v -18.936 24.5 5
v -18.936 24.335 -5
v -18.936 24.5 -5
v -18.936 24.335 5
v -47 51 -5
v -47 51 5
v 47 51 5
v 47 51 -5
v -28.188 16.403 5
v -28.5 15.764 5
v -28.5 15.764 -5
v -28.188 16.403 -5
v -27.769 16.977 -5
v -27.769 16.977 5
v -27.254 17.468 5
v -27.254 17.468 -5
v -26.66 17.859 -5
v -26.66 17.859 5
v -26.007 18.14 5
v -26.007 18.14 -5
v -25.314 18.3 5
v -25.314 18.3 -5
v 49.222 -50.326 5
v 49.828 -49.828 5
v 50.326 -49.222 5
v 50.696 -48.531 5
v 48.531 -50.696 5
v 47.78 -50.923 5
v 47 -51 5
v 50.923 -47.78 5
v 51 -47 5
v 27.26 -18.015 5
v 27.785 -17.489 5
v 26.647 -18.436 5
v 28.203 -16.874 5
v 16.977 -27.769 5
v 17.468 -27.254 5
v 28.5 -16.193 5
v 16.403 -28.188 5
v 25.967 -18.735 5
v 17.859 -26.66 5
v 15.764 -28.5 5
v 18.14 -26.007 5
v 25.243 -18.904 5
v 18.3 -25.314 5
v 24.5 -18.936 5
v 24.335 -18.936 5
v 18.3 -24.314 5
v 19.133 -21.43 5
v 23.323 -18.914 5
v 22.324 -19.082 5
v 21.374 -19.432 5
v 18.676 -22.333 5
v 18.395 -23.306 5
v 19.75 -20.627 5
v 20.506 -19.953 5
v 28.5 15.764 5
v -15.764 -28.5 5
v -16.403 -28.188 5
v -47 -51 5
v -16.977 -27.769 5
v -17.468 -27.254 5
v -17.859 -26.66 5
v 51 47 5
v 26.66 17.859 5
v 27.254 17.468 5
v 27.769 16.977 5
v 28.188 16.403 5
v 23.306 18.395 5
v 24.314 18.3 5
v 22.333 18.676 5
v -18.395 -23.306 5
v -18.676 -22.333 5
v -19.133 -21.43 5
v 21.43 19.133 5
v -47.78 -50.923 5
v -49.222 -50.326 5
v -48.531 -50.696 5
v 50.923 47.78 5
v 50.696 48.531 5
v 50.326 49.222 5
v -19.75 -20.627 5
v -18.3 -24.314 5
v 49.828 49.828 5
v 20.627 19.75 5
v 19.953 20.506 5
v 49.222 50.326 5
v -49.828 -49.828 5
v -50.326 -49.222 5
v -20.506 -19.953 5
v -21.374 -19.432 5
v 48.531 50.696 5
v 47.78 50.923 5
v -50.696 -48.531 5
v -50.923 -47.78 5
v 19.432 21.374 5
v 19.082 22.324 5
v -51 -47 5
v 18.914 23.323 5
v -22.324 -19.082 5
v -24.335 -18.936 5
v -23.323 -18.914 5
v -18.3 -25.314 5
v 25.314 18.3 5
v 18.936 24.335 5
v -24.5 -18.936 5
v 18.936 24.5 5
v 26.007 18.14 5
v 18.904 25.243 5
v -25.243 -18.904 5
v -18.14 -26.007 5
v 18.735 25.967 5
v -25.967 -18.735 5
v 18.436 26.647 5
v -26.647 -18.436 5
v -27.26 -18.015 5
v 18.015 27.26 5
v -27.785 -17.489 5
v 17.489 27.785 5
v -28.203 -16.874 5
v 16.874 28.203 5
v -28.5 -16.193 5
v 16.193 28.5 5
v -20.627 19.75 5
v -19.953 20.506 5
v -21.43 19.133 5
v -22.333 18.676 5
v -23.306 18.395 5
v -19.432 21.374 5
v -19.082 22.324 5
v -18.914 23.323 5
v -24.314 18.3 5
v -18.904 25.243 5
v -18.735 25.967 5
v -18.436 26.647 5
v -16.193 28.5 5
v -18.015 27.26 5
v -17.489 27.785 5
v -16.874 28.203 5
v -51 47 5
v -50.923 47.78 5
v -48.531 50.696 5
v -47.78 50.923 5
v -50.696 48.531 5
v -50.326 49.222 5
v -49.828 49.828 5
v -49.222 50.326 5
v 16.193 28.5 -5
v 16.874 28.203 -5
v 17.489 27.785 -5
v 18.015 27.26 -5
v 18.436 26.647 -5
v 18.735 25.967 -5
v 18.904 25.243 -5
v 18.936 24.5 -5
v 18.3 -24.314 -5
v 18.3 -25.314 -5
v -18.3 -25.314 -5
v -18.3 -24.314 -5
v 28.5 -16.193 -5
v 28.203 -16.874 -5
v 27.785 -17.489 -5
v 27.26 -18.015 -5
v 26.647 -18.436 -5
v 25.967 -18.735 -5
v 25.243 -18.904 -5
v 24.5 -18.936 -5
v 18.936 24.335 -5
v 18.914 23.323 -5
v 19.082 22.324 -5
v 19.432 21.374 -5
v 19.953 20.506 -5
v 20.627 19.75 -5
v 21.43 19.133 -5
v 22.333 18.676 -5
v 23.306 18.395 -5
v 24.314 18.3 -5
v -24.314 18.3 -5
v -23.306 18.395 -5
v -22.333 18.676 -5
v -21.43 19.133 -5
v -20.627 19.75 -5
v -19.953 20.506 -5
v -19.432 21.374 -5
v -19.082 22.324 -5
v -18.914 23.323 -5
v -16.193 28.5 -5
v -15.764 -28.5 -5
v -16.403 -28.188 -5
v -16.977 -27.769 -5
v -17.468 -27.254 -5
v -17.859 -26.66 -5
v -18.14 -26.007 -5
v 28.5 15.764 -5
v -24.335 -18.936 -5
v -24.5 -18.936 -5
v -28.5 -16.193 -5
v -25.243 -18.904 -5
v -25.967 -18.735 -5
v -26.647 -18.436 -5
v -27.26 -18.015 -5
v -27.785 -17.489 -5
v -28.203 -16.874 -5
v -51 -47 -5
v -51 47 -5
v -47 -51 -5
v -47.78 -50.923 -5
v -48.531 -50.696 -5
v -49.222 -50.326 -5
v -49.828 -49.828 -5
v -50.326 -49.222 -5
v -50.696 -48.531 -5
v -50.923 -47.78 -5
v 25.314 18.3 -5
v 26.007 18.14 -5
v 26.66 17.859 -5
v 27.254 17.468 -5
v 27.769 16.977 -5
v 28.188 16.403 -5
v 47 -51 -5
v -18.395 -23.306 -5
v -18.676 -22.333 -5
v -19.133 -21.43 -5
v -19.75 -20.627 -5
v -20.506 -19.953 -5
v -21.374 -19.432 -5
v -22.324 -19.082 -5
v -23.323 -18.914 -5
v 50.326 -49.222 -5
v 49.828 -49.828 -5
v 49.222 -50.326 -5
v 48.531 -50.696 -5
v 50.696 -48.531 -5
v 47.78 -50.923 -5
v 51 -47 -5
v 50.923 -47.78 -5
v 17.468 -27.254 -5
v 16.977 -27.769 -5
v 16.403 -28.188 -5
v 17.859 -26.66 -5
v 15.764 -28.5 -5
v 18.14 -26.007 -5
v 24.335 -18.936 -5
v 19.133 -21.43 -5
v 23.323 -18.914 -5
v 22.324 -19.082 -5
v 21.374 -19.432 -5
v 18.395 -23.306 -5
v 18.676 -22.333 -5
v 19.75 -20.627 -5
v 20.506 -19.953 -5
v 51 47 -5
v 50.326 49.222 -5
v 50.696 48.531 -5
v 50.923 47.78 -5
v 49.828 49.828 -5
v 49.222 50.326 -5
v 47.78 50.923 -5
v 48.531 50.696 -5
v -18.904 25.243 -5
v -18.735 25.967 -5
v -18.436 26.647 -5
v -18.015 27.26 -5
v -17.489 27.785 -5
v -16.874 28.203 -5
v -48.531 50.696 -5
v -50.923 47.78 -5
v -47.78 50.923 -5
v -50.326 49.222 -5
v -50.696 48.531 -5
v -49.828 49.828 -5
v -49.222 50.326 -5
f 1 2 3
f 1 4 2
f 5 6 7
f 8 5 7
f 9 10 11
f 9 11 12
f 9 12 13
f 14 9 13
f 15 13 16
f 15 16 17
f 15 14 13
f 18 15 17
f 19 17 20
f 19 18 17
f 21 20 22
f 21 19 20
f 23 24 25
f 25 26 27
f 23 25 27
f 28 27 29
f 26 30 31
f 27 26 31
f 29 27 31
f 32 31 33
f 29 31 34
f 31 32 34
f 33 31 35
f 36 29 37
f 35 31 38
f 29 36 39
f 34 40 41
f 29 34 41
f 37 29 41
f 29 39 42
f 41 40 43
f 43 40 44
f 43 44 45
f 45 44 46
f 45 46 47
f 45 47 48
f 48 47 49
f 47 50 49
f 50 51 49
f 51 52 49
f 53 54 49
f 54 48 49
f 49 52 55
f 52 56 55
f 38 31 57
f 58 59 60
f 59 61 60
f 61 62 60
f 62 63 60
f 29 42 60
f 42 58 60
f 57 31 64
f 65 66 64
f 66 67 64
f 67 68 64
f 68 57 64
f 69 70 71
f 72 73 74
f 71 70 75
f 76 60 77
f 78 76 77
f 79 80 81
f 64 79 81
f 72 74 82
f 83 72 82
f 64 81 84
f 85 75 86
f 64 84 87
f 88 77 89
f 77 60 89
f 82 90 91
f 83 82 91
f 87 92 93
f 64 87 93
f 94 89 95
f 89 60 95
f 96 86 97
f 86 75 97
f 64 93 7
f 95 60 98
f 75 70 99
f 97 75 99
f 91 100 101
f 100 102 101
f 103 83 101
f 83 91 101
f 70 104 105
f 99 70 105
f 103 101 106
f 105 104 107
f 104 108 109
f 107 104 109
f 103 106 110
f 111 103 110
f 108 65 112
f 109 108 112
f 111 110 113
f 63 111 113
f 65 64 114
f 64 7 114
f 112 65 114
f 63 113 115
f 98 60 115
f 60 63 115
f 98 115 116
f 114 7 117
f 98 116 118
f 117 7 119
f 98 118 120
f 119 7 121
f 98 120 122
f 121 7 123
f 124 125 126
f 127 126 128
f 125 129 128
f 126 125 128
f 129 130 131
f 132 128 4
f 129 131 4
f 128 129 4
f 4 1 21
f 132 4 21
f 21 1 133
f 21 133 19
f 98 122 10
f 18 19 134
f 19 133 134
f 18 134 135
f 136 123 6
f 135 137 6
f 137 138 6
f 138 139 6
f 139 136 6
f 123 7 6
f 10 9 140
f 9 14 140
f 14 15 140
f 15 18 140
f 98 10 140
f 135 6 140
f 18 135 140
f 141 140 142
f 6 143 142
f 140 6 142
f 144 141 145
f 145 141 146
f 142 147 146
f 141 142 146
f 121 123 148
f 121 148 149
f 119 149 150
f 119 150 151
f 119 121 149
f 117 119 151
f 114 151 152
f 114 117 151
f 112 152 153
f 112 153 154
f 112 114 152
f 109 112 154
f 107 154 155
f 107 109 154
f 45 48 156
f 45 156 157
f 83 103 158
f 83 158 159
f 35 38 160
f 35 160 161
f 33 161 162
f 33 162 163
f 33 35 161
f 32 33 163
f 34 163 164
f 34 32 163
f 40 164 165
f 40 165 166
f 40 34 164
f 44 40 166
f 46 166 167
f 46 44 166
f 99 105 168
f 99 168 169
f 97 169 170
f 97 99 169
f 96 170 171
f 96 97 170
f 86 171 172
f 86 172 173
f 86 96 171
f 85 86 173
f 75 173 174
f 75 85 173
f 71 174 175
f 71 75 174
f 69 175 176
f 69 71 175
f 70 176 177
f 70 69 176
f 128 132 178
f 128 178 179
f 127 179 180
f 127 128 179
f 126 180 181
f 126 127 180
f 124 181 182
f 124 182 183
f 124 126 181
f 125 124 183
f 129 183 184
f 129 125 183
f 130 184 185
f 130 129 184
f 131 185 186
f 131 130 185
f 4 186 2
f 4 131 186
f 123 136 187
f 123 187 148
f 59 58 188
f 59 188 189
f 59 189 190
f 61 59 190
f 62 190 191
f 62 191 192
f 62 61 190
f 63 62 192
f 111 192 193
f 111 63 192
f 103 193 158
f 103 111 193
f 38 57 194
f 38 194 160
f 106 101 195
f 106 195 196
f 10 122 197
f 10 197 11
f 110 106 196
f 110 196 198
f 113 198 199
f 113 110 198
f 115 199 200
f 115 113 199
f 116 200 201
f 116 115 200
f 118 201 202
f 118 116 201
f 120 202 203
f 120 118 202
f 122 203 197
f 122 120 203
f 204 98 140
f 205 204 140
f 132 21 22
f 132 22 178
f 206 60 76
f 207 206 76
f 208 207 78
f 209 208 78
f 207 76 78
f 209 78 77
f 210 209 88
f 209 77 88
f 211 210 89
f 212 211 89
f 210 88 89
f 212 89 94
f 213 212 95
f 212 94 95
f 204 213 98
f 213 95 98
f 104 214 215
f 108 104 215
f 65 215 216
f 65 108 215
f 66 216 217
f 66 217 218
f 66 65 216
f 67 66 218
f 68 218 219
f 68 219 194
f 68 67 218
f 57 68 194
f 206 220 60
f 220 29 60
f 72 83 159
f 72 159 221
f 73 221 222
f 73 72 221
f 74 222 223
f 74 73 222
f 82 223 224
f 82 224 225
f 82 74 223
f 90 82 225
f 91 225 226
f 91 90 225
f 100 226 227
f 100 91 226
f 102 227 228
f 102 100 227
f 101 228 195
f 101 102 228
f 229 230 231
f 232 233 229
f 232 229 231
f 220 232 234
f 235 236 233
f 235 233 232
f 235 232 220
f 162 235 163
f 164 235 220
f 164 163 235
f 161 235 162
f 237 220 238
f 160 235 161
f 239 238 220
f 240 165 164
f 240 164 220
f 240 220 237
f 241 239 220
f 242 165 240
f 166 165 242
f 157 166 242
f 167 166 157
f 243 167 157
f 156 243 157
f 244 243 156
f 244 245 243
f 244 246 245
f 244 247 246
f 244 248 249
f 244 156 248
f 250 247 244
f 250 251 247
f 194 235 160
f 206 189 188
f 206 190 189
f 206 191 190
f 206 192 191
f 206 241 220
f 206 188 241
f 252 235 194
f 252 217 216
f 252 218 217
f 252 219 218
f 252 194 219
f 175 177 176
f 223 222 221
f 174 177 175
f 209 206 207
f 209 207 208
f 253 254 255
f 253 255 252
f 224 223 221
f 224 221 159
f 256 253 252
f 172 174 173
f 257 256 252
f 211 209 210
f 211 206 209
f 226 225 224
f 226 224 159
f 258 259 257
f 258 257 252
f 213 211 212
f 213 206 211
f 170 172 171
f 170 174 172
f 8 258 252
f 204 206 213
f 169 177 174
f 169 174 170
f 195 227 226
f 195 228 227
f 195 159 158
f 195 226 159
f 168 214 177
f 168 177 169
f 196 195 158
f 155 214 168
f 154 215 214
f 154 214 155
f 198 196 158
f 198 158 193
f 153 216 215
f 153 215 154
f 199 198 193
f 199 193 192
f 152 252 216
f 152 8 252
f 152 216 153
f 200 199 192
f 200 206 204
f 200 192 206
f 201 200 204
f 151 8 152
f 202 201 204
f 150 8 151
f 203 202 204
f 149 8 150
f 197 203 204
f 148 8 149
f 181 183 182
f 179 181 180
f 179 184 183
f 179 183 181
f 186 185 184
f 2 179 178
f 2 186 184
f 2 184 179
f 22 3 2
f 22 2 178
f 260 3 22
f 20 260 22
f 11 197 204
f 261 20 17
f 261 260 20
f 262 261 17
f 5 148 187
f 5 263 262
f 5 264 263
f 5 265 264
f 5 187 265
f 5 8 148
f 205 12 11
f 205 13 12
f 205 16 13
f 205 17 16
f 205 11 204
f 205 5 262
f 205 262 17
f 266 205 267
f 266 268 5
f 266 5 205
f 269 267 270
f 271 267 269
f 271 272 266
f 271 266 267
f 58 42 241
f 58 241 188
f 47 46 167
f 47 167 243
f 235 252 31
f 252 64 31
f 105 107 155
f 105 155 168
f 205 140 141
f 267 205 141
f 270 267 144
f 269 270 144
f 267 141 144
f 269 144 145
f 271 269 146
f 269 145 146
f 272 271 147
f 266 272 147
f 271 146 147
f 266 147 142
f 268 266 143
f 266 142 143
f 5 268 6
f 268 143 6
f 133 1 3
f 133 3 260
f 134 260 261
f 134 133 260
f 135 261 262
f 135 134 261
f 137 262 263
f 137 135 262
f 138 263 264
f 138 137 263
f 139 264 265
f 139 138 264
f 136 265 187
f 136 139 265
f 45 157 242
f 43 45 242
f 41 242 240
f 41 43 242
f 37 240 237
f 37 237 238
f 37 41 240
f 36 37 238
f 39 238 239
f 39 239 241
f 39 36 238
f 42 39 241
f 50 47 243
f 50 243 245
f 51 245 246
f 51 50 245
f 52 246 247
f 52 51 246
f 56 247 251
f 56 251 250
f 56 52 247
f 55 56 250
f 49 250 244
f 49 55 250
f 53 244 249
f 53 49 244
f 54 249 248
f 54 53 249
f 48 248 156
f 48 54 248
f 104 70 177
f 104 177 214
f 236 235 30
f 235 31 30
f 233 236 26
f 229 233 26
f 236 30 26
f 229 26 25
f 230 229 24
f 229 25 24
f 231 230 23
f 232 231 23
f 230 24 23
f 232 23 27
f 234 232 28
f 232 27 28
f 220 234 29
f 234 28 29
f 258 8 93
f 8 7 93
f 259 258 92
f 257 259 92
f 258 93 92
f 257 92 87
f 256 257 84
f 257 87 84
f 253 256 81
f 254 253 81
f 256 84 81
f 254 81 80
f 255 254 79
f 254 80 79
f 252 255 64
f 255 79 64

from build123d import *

# Parameters (mm, degrees)
BOSS_EXTRUDE1_DEPTH = 5


with BuildPart() as part:
    # Sketch1 → Boss-Extrude1 (new, symmetric)
    with BuildSketch(Plane.XY):
        with BuildLine():
            Line((-47, 51), (47, 51))
            ThreePointArc((47, 51), (49.828427125, 49.828427125), (51, 47))
            Line((51, 47), (51, -47))
            ThreePointArc((51, -47), (49.828427125, -49.828427125), (47, -51))
            Line((47, -51), (-47, -51))
            ThreePointArc((-47, -51), (-49.828427125, -49.828427125), (-51, -47))
            Line((-51, -47), (-51, 47))
            ThreePointArc((-51, 47), (-49.828427125, 49.828427125), (-47, 51))
        make_face()
        with BuildLine():
            Line((-18.935786438, 24.335135157), (-18.935786438, 24.5))
            ThreePointArc((-18.935786438, 24.5), (-18.239751149, 26.963133018), (-16.192917188, 28.5))
            Line((-16.192917188, 28.5), (16.192917188, 28.5))
            ThreePointArc((16.192917188, 28.5), (18.239751149, 26.963133018), (18.935786438, 24.5))
            Line((18.935786438, 24.5), (18.935786438, 24.335135157))
            ThreePointArc((18.935786438, 24.335135157), (20.272310951, 20.112043563), (24.314285714, 18.300072152))
            Line((24.314285714, 18.300072152), (25.314285714, 18.300072152))
            ThreePointArc((25.314285714, 18.300072152), (27.253927817, 17.467886008), (28.5, 15.76434576))
            Line((28.5, 15.76434576), (28.5, -16.192917188))
            ThreePointArc((28.5, -16.192917188), (26.963133018, -18.239751149), (24.5, -18.935786438))
            Line((24.5, -18.935786438), (24.335135157, -18.935786438))
            ThreePointArc((24.335135157, -18.935786438), (20.112043563, -20.272310951), (18.300072152, -24.314285714))
            Line((18.300072152, -24.314285714), (18.300072152, -25.314285714))
            ThreePointArc((18.300072152, -25.314285714), (17.467886008, -27.253927817), (15.76434576, -28.5))
            Line((15.76434576, -28.5), (-15.76434576, -28.5))
            ThreePointArc((-15.76434576, -28.5), (-17.467886008, -27.253927817), (-18.300072152, -25.314285714))
            Line((-18.300072152, -25.314285714), (-18.300072152, -24.314285714))
            ThreePointArc((-18.300072152, -24.314285714), (-20.112043563, -20.272310951), (-24.335135157, -18.935786438))
            Line((-24.335135157, -18.935786438), (-24.5, -18.935786438))
            ThreePointArc((-24.5, -18.935786438), (-26.963133018, -18.239751149), (-28.5, -16.192917188))
            Line((-28.5, -16.192917188), (-28.5, 15.76434576))
            ThreePointArc((-28.5, 15.76434576), (-27.253927817, 17.467886008), (-25.314285714, 18.300072152))
            Line((-25.314285714, 18.300072152), (-24.314285714, 18.300072152))
            ThreePointArc((-24.314285714, 18.300072152), (-20.272310951, 20.112043563), (-18.935786438, 24.335135157))
        make_face(mode=Mode.SUBTRACT)
    extrude(amount=BOSS_EXTRUDE1_DEPTH, both=True)


solid = part.part
